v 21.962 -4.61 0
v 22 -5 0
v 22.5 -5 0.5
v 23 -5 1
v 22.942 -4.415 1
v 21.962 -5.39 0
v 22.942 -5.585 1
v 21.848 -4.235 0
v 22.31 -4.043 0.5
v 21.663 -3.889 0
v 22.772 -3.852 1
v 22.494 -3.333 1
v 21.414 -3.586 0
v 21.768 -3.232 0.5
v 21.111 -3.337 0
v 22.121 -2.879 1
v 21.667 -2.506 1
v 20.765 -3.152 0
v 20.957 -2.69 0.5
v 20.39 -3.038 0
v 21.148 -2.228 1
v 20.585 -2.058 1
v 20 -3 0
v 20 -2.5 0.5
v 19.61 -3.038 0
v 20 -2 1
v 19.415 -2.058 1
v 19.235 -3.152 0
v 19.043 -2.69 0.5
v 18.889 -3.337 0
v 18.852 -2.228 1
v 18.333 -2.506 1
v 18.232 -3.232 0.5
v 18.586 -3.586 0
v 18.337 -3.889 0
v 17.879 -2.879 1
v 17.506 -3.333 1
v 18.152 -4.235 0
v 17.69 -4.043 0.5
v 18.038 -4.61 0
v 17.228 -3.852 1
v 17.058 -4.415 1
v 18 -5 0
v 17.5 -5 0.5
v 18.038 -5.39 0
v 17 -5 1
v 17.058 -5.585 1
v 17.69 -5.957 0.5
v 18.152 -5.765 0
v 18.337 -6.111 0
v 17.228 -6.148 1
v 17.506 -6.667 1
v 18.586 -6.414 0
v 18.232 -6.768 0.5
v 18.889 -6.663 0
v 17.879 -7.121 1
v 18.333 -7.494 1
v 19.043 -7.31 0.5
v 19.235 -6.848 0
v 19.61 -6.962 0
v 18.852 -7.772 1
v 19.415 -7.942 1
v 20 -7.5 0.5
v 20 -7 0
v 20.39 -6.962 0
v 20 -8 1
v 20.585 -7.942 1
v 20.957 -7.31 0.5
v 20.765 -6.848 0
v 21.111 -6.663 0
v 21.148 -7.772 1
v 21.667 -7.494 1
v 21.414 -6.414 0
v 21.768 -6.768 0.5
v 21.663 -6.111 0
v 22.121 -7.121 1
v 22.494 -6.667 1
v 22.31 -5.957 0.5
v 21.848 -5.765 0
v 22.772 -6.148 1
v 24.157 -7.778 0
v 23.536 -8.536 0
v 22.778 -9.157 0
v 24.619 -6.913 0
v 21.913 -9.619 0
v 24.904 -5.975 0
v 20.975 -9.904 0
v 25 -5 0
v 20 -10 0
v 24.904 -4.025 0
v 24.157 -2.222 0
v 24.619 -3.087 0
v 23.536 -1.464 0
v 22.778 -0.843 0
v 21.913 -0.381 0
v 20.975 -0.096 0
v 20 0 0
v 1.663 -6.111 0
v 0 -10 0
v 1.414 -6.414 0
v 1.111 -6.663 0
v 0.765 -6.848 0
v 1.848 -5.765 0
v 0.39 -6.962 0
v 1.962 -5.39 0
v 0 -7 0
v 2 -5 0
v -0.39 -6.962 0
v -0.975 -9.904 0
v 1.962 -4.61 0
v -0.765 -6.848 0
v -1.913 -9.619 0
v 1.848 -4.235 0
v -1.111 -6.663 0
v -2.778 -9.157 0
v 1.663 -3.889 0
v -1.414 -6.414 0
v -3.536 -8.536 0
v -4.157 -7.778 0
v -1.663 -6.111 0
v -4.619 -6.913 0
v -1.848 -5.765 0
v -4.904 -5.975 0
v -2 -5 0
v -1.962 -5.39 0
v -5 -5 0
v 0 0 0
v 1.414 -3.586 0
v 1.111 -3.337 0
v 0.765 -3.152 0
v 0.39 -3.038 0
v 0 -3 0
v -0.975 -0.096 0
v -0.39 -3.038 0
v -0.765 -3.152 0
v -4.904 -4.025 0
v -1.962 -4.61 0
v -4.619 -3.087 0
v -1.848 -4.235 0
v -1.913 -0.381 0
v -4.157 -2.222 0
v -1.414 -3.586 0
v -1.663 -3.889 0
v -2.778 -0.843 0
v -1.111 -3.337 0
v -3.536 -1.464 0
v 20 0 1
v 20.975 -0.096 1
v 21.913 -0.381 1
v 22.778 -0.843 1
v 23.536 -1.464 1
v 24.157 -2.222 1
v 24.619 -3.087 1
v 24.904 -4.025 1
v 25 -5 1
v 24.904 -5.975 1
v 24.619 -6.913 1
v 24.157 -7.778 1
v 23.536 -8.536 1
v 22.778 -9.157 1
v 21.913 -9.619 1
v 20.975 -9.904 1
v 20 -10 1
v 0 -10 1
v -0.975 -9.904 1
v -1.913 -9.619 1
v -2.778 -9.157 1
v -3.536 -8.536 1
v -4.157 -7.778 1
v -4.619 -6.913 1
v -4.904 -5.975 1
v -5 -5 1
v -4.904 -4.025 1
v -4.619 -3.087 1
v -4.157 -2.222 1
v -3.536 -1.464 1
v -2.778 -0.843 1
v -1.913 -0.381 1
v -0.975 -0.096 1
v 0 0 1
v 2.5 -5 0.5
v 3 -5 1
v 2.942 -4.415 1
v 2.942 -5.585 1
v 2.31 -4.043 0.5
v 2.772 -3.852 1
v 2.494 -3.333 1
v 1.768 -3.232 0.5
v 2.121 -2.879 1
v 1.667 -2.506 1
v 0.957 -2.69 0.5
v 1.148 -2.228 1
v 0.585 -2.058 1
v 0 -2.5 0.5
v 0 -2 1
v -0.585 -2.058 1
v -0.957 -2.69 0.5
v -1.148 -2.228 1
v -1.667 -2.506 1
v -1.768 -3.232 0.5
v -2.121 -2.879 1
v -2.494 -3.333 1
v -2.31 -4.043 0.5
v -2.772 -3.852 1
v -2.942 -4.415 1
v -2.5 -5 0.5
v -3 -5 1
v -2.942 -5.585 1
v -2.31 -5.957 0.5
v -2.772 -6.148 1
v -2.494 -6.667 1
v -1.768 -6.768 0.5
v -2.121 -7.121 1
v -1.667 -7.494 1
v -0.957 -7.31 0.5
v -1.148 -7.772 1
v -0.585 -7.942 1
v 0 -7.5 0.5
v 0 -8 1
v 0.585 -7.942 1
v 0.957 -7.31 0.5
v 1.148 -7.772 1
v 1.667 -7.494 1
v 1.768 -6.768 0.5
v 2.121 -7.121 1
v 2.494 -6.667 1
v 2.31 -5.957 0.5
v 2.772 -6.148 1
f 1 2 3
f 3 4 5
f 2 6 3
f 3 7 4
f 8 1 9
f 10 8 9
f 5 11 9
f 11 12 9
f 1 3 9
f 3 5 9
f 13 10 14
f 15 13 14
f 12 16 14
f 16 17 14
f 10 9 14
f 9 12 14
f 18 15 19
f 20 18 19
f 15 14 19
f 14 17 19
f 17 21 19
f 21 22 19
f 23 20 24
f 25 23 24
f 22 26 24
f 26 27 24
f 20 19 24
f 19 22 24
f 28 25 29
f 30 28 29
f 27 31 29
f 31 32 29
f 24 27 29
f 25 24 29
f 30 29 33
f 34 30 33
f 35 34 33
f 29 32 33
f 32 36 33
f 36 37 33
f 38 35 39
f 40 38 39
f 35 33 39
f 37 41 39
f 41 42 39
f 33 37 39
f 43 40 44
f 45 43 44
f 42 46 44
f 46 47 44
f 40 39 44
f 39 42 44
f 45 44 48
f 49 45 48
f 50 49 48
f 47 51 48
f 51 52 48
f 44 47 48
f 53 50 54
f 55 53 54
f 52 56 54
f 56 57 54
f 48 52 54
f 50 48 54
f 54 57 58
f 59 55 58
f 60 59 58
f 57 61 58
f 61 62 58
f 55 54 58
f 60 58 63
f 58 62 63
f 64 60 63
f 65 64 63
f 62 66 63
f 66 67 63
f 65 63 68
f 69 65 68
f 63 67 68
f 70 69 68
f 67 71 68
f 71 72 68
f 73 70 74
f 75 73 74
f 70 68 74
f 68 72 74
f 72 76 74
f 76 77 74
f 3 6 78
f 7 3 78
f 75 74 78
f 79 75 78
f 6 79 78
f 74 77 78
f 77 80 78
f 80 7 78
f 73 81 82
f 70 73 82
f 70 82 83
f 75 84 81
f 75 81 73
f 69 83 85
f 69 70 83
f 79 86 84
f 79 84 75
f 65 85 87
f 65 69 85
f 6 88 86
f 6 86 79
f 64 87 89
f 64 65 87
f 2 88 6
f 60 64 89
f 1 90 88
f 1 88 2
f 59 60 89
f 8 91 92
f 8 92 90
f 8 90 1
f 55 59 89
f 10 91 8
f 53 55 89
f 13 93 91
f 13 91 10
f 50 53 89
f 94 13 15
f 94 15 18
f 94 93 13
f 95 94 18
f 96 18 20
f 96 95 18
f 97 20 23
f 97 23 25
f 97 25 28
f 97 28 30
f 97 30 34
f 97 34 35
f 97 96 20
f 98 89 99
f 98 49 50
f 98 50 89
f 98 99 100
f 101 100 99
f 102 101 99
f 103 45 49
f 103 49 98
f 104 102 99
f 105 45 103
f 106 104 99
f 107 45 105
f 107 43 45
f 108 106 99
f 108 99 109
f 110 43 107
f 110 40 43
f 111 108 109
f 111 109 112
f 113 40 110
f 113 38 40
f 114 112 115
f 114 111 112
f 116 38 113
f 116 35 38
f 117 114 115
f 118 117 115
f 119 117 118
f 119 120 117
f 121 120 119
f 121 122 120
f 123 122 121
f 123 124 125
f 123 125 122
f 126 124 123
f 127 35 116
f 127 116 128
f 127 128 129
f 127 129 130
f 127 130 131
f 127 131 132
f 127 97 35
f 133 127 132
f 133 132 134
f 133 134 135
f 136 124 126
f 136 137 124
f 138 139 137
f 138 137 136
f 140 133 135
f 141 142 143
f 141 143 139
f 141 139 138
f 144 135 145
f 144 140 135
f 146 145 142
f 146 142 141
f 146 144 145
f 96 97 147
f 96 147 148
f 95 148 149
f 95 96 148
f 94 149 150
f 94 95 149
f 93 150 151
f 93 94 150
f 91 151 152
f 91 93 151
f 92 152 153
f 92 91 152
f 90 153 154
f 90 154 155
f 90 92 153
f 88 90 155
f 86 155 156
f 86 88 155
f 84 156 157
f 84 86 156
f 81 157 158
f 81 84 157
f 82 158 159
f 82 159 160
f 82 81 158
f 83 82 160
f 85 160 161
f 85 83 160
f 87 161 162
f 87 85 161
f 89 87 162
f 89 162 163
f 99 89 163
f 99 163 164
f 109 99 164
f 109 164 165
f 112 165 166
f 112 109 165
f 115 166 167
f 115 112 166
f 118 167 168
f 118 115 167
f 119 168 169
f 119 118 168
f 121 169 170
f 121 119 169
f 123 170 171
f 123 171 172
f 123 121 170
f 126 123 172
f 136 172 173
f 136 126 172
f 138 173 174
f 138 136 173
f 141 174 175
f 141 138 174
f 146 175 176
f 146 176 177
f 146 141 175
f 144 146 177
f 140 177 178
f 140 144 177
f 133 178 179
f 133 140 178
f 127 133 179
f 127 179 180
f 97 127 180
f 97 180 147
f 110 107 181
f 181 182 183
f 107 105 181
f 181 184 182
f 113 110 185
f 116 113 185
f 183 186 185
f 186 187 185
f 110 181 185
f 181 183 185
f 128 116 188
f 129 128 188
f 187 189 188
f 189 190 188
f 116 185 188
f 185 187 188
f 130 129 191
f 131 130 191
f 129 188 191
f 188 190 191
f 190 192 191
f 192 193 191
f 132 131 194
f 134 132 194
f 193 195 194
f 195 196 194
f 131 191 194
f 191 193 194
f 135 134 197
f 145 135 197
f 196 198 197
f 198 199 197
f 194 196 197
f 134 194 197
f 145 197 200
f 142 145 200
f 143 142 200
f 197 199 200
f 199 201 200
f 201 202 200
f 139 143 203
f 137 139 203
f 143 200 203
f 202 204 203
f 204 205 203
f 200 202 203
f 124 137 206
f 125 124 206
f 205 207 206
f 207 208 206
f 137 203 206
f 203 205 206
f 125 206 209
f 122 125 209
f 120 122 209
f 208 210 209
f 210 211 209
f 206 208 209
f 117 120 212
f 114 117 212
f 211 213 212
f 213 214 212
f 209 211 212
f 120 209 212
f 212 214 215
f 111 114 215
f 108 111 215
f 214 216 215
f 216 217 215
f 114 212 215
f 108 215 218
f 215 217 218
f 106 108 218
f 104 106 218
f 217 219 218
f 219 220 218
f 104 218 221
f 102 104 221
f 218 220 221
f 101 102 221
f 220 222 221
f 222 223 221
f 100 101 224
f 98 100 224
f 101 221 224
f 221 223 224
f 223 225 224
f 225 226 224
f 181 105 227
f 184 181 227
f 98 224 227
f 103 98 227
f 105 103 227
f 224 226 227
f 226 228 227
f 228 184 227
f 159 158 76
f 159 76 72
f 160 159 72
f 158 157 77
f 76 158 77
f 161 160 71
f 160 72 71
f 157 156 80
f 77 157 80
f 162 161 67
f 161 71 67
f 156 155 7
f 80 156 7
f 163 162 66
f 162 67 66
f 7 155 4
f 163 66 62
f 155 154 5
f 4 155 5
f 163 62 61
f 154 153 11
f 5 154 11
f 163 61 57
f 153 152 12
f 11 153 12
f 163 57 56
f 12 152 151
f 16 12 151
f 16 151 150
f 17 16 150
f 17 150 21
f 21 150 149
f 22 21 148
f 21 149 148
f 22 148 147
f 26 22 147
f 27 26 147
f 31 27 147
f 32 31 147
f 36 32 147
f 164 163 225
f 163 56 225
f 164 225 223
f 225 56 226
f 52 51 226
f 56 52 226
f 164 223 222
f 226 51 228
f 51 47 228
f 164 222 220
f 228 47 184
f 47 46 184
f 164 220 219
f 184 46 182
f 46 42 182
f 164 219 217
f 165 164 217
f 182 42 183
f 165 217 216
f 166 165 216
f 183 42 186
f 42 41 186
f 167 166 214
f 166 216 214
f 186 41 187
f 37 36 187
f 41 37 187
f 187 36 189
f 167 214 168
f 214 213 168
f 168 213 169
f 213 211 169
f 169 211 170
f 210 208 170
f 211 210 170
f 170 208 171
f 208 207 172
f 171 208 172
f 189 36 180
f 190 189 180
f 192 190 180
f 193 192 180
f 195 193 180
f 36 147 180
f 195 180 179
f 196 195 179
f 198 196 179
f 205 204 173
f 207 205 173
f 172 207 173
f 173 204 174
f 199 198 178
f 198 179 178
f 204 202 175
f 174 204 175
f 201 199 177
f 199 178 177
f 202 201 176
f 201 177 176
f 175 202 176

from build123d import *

# Parameters (mm, degrees)
ESQUISSE1_R        = 2
BOSS_EXTRU_1_DEPTH = 1
CHANFREIN1_SIZE    = 1


with BuildPart() as part:
    # Esquisse1 → Boss.-Extru.1 (new body)
    with BuildSketch(Plane.XY):
        with BuildLine():
            Line((0, 0), (20, 0))
            ThreePointArc((20, 0), (25, -5), (20, -10))
            Line((20, -10), (0, -10))
            ThreePointArc((0, -10), (-5, -5), (0, 0))
        make_face()
        with Locations((0, -5)):
            Circle(ESQUISSE1_R, mode=Mode.SUBTRACT)
        with Locations((20, -5)):
            Circle(ESQUISSE1_R, mode=Mode.SUBTRACT)
    extrude(amount=BOSS_EXTRU_1_DEPTH)

    # Chanfrein1
    chanfrein1_edges = [part.edges().sort_by_distance(p)[0] for p in [
        (-2, -5, 1),
        (18, -5, 1),
    ]]
    chamfer(chanfrein1_edges, length=CHANFREIN1_SIZE - 0.0001)  # a hair under: the kernel refuses the full size


solid = part.part
